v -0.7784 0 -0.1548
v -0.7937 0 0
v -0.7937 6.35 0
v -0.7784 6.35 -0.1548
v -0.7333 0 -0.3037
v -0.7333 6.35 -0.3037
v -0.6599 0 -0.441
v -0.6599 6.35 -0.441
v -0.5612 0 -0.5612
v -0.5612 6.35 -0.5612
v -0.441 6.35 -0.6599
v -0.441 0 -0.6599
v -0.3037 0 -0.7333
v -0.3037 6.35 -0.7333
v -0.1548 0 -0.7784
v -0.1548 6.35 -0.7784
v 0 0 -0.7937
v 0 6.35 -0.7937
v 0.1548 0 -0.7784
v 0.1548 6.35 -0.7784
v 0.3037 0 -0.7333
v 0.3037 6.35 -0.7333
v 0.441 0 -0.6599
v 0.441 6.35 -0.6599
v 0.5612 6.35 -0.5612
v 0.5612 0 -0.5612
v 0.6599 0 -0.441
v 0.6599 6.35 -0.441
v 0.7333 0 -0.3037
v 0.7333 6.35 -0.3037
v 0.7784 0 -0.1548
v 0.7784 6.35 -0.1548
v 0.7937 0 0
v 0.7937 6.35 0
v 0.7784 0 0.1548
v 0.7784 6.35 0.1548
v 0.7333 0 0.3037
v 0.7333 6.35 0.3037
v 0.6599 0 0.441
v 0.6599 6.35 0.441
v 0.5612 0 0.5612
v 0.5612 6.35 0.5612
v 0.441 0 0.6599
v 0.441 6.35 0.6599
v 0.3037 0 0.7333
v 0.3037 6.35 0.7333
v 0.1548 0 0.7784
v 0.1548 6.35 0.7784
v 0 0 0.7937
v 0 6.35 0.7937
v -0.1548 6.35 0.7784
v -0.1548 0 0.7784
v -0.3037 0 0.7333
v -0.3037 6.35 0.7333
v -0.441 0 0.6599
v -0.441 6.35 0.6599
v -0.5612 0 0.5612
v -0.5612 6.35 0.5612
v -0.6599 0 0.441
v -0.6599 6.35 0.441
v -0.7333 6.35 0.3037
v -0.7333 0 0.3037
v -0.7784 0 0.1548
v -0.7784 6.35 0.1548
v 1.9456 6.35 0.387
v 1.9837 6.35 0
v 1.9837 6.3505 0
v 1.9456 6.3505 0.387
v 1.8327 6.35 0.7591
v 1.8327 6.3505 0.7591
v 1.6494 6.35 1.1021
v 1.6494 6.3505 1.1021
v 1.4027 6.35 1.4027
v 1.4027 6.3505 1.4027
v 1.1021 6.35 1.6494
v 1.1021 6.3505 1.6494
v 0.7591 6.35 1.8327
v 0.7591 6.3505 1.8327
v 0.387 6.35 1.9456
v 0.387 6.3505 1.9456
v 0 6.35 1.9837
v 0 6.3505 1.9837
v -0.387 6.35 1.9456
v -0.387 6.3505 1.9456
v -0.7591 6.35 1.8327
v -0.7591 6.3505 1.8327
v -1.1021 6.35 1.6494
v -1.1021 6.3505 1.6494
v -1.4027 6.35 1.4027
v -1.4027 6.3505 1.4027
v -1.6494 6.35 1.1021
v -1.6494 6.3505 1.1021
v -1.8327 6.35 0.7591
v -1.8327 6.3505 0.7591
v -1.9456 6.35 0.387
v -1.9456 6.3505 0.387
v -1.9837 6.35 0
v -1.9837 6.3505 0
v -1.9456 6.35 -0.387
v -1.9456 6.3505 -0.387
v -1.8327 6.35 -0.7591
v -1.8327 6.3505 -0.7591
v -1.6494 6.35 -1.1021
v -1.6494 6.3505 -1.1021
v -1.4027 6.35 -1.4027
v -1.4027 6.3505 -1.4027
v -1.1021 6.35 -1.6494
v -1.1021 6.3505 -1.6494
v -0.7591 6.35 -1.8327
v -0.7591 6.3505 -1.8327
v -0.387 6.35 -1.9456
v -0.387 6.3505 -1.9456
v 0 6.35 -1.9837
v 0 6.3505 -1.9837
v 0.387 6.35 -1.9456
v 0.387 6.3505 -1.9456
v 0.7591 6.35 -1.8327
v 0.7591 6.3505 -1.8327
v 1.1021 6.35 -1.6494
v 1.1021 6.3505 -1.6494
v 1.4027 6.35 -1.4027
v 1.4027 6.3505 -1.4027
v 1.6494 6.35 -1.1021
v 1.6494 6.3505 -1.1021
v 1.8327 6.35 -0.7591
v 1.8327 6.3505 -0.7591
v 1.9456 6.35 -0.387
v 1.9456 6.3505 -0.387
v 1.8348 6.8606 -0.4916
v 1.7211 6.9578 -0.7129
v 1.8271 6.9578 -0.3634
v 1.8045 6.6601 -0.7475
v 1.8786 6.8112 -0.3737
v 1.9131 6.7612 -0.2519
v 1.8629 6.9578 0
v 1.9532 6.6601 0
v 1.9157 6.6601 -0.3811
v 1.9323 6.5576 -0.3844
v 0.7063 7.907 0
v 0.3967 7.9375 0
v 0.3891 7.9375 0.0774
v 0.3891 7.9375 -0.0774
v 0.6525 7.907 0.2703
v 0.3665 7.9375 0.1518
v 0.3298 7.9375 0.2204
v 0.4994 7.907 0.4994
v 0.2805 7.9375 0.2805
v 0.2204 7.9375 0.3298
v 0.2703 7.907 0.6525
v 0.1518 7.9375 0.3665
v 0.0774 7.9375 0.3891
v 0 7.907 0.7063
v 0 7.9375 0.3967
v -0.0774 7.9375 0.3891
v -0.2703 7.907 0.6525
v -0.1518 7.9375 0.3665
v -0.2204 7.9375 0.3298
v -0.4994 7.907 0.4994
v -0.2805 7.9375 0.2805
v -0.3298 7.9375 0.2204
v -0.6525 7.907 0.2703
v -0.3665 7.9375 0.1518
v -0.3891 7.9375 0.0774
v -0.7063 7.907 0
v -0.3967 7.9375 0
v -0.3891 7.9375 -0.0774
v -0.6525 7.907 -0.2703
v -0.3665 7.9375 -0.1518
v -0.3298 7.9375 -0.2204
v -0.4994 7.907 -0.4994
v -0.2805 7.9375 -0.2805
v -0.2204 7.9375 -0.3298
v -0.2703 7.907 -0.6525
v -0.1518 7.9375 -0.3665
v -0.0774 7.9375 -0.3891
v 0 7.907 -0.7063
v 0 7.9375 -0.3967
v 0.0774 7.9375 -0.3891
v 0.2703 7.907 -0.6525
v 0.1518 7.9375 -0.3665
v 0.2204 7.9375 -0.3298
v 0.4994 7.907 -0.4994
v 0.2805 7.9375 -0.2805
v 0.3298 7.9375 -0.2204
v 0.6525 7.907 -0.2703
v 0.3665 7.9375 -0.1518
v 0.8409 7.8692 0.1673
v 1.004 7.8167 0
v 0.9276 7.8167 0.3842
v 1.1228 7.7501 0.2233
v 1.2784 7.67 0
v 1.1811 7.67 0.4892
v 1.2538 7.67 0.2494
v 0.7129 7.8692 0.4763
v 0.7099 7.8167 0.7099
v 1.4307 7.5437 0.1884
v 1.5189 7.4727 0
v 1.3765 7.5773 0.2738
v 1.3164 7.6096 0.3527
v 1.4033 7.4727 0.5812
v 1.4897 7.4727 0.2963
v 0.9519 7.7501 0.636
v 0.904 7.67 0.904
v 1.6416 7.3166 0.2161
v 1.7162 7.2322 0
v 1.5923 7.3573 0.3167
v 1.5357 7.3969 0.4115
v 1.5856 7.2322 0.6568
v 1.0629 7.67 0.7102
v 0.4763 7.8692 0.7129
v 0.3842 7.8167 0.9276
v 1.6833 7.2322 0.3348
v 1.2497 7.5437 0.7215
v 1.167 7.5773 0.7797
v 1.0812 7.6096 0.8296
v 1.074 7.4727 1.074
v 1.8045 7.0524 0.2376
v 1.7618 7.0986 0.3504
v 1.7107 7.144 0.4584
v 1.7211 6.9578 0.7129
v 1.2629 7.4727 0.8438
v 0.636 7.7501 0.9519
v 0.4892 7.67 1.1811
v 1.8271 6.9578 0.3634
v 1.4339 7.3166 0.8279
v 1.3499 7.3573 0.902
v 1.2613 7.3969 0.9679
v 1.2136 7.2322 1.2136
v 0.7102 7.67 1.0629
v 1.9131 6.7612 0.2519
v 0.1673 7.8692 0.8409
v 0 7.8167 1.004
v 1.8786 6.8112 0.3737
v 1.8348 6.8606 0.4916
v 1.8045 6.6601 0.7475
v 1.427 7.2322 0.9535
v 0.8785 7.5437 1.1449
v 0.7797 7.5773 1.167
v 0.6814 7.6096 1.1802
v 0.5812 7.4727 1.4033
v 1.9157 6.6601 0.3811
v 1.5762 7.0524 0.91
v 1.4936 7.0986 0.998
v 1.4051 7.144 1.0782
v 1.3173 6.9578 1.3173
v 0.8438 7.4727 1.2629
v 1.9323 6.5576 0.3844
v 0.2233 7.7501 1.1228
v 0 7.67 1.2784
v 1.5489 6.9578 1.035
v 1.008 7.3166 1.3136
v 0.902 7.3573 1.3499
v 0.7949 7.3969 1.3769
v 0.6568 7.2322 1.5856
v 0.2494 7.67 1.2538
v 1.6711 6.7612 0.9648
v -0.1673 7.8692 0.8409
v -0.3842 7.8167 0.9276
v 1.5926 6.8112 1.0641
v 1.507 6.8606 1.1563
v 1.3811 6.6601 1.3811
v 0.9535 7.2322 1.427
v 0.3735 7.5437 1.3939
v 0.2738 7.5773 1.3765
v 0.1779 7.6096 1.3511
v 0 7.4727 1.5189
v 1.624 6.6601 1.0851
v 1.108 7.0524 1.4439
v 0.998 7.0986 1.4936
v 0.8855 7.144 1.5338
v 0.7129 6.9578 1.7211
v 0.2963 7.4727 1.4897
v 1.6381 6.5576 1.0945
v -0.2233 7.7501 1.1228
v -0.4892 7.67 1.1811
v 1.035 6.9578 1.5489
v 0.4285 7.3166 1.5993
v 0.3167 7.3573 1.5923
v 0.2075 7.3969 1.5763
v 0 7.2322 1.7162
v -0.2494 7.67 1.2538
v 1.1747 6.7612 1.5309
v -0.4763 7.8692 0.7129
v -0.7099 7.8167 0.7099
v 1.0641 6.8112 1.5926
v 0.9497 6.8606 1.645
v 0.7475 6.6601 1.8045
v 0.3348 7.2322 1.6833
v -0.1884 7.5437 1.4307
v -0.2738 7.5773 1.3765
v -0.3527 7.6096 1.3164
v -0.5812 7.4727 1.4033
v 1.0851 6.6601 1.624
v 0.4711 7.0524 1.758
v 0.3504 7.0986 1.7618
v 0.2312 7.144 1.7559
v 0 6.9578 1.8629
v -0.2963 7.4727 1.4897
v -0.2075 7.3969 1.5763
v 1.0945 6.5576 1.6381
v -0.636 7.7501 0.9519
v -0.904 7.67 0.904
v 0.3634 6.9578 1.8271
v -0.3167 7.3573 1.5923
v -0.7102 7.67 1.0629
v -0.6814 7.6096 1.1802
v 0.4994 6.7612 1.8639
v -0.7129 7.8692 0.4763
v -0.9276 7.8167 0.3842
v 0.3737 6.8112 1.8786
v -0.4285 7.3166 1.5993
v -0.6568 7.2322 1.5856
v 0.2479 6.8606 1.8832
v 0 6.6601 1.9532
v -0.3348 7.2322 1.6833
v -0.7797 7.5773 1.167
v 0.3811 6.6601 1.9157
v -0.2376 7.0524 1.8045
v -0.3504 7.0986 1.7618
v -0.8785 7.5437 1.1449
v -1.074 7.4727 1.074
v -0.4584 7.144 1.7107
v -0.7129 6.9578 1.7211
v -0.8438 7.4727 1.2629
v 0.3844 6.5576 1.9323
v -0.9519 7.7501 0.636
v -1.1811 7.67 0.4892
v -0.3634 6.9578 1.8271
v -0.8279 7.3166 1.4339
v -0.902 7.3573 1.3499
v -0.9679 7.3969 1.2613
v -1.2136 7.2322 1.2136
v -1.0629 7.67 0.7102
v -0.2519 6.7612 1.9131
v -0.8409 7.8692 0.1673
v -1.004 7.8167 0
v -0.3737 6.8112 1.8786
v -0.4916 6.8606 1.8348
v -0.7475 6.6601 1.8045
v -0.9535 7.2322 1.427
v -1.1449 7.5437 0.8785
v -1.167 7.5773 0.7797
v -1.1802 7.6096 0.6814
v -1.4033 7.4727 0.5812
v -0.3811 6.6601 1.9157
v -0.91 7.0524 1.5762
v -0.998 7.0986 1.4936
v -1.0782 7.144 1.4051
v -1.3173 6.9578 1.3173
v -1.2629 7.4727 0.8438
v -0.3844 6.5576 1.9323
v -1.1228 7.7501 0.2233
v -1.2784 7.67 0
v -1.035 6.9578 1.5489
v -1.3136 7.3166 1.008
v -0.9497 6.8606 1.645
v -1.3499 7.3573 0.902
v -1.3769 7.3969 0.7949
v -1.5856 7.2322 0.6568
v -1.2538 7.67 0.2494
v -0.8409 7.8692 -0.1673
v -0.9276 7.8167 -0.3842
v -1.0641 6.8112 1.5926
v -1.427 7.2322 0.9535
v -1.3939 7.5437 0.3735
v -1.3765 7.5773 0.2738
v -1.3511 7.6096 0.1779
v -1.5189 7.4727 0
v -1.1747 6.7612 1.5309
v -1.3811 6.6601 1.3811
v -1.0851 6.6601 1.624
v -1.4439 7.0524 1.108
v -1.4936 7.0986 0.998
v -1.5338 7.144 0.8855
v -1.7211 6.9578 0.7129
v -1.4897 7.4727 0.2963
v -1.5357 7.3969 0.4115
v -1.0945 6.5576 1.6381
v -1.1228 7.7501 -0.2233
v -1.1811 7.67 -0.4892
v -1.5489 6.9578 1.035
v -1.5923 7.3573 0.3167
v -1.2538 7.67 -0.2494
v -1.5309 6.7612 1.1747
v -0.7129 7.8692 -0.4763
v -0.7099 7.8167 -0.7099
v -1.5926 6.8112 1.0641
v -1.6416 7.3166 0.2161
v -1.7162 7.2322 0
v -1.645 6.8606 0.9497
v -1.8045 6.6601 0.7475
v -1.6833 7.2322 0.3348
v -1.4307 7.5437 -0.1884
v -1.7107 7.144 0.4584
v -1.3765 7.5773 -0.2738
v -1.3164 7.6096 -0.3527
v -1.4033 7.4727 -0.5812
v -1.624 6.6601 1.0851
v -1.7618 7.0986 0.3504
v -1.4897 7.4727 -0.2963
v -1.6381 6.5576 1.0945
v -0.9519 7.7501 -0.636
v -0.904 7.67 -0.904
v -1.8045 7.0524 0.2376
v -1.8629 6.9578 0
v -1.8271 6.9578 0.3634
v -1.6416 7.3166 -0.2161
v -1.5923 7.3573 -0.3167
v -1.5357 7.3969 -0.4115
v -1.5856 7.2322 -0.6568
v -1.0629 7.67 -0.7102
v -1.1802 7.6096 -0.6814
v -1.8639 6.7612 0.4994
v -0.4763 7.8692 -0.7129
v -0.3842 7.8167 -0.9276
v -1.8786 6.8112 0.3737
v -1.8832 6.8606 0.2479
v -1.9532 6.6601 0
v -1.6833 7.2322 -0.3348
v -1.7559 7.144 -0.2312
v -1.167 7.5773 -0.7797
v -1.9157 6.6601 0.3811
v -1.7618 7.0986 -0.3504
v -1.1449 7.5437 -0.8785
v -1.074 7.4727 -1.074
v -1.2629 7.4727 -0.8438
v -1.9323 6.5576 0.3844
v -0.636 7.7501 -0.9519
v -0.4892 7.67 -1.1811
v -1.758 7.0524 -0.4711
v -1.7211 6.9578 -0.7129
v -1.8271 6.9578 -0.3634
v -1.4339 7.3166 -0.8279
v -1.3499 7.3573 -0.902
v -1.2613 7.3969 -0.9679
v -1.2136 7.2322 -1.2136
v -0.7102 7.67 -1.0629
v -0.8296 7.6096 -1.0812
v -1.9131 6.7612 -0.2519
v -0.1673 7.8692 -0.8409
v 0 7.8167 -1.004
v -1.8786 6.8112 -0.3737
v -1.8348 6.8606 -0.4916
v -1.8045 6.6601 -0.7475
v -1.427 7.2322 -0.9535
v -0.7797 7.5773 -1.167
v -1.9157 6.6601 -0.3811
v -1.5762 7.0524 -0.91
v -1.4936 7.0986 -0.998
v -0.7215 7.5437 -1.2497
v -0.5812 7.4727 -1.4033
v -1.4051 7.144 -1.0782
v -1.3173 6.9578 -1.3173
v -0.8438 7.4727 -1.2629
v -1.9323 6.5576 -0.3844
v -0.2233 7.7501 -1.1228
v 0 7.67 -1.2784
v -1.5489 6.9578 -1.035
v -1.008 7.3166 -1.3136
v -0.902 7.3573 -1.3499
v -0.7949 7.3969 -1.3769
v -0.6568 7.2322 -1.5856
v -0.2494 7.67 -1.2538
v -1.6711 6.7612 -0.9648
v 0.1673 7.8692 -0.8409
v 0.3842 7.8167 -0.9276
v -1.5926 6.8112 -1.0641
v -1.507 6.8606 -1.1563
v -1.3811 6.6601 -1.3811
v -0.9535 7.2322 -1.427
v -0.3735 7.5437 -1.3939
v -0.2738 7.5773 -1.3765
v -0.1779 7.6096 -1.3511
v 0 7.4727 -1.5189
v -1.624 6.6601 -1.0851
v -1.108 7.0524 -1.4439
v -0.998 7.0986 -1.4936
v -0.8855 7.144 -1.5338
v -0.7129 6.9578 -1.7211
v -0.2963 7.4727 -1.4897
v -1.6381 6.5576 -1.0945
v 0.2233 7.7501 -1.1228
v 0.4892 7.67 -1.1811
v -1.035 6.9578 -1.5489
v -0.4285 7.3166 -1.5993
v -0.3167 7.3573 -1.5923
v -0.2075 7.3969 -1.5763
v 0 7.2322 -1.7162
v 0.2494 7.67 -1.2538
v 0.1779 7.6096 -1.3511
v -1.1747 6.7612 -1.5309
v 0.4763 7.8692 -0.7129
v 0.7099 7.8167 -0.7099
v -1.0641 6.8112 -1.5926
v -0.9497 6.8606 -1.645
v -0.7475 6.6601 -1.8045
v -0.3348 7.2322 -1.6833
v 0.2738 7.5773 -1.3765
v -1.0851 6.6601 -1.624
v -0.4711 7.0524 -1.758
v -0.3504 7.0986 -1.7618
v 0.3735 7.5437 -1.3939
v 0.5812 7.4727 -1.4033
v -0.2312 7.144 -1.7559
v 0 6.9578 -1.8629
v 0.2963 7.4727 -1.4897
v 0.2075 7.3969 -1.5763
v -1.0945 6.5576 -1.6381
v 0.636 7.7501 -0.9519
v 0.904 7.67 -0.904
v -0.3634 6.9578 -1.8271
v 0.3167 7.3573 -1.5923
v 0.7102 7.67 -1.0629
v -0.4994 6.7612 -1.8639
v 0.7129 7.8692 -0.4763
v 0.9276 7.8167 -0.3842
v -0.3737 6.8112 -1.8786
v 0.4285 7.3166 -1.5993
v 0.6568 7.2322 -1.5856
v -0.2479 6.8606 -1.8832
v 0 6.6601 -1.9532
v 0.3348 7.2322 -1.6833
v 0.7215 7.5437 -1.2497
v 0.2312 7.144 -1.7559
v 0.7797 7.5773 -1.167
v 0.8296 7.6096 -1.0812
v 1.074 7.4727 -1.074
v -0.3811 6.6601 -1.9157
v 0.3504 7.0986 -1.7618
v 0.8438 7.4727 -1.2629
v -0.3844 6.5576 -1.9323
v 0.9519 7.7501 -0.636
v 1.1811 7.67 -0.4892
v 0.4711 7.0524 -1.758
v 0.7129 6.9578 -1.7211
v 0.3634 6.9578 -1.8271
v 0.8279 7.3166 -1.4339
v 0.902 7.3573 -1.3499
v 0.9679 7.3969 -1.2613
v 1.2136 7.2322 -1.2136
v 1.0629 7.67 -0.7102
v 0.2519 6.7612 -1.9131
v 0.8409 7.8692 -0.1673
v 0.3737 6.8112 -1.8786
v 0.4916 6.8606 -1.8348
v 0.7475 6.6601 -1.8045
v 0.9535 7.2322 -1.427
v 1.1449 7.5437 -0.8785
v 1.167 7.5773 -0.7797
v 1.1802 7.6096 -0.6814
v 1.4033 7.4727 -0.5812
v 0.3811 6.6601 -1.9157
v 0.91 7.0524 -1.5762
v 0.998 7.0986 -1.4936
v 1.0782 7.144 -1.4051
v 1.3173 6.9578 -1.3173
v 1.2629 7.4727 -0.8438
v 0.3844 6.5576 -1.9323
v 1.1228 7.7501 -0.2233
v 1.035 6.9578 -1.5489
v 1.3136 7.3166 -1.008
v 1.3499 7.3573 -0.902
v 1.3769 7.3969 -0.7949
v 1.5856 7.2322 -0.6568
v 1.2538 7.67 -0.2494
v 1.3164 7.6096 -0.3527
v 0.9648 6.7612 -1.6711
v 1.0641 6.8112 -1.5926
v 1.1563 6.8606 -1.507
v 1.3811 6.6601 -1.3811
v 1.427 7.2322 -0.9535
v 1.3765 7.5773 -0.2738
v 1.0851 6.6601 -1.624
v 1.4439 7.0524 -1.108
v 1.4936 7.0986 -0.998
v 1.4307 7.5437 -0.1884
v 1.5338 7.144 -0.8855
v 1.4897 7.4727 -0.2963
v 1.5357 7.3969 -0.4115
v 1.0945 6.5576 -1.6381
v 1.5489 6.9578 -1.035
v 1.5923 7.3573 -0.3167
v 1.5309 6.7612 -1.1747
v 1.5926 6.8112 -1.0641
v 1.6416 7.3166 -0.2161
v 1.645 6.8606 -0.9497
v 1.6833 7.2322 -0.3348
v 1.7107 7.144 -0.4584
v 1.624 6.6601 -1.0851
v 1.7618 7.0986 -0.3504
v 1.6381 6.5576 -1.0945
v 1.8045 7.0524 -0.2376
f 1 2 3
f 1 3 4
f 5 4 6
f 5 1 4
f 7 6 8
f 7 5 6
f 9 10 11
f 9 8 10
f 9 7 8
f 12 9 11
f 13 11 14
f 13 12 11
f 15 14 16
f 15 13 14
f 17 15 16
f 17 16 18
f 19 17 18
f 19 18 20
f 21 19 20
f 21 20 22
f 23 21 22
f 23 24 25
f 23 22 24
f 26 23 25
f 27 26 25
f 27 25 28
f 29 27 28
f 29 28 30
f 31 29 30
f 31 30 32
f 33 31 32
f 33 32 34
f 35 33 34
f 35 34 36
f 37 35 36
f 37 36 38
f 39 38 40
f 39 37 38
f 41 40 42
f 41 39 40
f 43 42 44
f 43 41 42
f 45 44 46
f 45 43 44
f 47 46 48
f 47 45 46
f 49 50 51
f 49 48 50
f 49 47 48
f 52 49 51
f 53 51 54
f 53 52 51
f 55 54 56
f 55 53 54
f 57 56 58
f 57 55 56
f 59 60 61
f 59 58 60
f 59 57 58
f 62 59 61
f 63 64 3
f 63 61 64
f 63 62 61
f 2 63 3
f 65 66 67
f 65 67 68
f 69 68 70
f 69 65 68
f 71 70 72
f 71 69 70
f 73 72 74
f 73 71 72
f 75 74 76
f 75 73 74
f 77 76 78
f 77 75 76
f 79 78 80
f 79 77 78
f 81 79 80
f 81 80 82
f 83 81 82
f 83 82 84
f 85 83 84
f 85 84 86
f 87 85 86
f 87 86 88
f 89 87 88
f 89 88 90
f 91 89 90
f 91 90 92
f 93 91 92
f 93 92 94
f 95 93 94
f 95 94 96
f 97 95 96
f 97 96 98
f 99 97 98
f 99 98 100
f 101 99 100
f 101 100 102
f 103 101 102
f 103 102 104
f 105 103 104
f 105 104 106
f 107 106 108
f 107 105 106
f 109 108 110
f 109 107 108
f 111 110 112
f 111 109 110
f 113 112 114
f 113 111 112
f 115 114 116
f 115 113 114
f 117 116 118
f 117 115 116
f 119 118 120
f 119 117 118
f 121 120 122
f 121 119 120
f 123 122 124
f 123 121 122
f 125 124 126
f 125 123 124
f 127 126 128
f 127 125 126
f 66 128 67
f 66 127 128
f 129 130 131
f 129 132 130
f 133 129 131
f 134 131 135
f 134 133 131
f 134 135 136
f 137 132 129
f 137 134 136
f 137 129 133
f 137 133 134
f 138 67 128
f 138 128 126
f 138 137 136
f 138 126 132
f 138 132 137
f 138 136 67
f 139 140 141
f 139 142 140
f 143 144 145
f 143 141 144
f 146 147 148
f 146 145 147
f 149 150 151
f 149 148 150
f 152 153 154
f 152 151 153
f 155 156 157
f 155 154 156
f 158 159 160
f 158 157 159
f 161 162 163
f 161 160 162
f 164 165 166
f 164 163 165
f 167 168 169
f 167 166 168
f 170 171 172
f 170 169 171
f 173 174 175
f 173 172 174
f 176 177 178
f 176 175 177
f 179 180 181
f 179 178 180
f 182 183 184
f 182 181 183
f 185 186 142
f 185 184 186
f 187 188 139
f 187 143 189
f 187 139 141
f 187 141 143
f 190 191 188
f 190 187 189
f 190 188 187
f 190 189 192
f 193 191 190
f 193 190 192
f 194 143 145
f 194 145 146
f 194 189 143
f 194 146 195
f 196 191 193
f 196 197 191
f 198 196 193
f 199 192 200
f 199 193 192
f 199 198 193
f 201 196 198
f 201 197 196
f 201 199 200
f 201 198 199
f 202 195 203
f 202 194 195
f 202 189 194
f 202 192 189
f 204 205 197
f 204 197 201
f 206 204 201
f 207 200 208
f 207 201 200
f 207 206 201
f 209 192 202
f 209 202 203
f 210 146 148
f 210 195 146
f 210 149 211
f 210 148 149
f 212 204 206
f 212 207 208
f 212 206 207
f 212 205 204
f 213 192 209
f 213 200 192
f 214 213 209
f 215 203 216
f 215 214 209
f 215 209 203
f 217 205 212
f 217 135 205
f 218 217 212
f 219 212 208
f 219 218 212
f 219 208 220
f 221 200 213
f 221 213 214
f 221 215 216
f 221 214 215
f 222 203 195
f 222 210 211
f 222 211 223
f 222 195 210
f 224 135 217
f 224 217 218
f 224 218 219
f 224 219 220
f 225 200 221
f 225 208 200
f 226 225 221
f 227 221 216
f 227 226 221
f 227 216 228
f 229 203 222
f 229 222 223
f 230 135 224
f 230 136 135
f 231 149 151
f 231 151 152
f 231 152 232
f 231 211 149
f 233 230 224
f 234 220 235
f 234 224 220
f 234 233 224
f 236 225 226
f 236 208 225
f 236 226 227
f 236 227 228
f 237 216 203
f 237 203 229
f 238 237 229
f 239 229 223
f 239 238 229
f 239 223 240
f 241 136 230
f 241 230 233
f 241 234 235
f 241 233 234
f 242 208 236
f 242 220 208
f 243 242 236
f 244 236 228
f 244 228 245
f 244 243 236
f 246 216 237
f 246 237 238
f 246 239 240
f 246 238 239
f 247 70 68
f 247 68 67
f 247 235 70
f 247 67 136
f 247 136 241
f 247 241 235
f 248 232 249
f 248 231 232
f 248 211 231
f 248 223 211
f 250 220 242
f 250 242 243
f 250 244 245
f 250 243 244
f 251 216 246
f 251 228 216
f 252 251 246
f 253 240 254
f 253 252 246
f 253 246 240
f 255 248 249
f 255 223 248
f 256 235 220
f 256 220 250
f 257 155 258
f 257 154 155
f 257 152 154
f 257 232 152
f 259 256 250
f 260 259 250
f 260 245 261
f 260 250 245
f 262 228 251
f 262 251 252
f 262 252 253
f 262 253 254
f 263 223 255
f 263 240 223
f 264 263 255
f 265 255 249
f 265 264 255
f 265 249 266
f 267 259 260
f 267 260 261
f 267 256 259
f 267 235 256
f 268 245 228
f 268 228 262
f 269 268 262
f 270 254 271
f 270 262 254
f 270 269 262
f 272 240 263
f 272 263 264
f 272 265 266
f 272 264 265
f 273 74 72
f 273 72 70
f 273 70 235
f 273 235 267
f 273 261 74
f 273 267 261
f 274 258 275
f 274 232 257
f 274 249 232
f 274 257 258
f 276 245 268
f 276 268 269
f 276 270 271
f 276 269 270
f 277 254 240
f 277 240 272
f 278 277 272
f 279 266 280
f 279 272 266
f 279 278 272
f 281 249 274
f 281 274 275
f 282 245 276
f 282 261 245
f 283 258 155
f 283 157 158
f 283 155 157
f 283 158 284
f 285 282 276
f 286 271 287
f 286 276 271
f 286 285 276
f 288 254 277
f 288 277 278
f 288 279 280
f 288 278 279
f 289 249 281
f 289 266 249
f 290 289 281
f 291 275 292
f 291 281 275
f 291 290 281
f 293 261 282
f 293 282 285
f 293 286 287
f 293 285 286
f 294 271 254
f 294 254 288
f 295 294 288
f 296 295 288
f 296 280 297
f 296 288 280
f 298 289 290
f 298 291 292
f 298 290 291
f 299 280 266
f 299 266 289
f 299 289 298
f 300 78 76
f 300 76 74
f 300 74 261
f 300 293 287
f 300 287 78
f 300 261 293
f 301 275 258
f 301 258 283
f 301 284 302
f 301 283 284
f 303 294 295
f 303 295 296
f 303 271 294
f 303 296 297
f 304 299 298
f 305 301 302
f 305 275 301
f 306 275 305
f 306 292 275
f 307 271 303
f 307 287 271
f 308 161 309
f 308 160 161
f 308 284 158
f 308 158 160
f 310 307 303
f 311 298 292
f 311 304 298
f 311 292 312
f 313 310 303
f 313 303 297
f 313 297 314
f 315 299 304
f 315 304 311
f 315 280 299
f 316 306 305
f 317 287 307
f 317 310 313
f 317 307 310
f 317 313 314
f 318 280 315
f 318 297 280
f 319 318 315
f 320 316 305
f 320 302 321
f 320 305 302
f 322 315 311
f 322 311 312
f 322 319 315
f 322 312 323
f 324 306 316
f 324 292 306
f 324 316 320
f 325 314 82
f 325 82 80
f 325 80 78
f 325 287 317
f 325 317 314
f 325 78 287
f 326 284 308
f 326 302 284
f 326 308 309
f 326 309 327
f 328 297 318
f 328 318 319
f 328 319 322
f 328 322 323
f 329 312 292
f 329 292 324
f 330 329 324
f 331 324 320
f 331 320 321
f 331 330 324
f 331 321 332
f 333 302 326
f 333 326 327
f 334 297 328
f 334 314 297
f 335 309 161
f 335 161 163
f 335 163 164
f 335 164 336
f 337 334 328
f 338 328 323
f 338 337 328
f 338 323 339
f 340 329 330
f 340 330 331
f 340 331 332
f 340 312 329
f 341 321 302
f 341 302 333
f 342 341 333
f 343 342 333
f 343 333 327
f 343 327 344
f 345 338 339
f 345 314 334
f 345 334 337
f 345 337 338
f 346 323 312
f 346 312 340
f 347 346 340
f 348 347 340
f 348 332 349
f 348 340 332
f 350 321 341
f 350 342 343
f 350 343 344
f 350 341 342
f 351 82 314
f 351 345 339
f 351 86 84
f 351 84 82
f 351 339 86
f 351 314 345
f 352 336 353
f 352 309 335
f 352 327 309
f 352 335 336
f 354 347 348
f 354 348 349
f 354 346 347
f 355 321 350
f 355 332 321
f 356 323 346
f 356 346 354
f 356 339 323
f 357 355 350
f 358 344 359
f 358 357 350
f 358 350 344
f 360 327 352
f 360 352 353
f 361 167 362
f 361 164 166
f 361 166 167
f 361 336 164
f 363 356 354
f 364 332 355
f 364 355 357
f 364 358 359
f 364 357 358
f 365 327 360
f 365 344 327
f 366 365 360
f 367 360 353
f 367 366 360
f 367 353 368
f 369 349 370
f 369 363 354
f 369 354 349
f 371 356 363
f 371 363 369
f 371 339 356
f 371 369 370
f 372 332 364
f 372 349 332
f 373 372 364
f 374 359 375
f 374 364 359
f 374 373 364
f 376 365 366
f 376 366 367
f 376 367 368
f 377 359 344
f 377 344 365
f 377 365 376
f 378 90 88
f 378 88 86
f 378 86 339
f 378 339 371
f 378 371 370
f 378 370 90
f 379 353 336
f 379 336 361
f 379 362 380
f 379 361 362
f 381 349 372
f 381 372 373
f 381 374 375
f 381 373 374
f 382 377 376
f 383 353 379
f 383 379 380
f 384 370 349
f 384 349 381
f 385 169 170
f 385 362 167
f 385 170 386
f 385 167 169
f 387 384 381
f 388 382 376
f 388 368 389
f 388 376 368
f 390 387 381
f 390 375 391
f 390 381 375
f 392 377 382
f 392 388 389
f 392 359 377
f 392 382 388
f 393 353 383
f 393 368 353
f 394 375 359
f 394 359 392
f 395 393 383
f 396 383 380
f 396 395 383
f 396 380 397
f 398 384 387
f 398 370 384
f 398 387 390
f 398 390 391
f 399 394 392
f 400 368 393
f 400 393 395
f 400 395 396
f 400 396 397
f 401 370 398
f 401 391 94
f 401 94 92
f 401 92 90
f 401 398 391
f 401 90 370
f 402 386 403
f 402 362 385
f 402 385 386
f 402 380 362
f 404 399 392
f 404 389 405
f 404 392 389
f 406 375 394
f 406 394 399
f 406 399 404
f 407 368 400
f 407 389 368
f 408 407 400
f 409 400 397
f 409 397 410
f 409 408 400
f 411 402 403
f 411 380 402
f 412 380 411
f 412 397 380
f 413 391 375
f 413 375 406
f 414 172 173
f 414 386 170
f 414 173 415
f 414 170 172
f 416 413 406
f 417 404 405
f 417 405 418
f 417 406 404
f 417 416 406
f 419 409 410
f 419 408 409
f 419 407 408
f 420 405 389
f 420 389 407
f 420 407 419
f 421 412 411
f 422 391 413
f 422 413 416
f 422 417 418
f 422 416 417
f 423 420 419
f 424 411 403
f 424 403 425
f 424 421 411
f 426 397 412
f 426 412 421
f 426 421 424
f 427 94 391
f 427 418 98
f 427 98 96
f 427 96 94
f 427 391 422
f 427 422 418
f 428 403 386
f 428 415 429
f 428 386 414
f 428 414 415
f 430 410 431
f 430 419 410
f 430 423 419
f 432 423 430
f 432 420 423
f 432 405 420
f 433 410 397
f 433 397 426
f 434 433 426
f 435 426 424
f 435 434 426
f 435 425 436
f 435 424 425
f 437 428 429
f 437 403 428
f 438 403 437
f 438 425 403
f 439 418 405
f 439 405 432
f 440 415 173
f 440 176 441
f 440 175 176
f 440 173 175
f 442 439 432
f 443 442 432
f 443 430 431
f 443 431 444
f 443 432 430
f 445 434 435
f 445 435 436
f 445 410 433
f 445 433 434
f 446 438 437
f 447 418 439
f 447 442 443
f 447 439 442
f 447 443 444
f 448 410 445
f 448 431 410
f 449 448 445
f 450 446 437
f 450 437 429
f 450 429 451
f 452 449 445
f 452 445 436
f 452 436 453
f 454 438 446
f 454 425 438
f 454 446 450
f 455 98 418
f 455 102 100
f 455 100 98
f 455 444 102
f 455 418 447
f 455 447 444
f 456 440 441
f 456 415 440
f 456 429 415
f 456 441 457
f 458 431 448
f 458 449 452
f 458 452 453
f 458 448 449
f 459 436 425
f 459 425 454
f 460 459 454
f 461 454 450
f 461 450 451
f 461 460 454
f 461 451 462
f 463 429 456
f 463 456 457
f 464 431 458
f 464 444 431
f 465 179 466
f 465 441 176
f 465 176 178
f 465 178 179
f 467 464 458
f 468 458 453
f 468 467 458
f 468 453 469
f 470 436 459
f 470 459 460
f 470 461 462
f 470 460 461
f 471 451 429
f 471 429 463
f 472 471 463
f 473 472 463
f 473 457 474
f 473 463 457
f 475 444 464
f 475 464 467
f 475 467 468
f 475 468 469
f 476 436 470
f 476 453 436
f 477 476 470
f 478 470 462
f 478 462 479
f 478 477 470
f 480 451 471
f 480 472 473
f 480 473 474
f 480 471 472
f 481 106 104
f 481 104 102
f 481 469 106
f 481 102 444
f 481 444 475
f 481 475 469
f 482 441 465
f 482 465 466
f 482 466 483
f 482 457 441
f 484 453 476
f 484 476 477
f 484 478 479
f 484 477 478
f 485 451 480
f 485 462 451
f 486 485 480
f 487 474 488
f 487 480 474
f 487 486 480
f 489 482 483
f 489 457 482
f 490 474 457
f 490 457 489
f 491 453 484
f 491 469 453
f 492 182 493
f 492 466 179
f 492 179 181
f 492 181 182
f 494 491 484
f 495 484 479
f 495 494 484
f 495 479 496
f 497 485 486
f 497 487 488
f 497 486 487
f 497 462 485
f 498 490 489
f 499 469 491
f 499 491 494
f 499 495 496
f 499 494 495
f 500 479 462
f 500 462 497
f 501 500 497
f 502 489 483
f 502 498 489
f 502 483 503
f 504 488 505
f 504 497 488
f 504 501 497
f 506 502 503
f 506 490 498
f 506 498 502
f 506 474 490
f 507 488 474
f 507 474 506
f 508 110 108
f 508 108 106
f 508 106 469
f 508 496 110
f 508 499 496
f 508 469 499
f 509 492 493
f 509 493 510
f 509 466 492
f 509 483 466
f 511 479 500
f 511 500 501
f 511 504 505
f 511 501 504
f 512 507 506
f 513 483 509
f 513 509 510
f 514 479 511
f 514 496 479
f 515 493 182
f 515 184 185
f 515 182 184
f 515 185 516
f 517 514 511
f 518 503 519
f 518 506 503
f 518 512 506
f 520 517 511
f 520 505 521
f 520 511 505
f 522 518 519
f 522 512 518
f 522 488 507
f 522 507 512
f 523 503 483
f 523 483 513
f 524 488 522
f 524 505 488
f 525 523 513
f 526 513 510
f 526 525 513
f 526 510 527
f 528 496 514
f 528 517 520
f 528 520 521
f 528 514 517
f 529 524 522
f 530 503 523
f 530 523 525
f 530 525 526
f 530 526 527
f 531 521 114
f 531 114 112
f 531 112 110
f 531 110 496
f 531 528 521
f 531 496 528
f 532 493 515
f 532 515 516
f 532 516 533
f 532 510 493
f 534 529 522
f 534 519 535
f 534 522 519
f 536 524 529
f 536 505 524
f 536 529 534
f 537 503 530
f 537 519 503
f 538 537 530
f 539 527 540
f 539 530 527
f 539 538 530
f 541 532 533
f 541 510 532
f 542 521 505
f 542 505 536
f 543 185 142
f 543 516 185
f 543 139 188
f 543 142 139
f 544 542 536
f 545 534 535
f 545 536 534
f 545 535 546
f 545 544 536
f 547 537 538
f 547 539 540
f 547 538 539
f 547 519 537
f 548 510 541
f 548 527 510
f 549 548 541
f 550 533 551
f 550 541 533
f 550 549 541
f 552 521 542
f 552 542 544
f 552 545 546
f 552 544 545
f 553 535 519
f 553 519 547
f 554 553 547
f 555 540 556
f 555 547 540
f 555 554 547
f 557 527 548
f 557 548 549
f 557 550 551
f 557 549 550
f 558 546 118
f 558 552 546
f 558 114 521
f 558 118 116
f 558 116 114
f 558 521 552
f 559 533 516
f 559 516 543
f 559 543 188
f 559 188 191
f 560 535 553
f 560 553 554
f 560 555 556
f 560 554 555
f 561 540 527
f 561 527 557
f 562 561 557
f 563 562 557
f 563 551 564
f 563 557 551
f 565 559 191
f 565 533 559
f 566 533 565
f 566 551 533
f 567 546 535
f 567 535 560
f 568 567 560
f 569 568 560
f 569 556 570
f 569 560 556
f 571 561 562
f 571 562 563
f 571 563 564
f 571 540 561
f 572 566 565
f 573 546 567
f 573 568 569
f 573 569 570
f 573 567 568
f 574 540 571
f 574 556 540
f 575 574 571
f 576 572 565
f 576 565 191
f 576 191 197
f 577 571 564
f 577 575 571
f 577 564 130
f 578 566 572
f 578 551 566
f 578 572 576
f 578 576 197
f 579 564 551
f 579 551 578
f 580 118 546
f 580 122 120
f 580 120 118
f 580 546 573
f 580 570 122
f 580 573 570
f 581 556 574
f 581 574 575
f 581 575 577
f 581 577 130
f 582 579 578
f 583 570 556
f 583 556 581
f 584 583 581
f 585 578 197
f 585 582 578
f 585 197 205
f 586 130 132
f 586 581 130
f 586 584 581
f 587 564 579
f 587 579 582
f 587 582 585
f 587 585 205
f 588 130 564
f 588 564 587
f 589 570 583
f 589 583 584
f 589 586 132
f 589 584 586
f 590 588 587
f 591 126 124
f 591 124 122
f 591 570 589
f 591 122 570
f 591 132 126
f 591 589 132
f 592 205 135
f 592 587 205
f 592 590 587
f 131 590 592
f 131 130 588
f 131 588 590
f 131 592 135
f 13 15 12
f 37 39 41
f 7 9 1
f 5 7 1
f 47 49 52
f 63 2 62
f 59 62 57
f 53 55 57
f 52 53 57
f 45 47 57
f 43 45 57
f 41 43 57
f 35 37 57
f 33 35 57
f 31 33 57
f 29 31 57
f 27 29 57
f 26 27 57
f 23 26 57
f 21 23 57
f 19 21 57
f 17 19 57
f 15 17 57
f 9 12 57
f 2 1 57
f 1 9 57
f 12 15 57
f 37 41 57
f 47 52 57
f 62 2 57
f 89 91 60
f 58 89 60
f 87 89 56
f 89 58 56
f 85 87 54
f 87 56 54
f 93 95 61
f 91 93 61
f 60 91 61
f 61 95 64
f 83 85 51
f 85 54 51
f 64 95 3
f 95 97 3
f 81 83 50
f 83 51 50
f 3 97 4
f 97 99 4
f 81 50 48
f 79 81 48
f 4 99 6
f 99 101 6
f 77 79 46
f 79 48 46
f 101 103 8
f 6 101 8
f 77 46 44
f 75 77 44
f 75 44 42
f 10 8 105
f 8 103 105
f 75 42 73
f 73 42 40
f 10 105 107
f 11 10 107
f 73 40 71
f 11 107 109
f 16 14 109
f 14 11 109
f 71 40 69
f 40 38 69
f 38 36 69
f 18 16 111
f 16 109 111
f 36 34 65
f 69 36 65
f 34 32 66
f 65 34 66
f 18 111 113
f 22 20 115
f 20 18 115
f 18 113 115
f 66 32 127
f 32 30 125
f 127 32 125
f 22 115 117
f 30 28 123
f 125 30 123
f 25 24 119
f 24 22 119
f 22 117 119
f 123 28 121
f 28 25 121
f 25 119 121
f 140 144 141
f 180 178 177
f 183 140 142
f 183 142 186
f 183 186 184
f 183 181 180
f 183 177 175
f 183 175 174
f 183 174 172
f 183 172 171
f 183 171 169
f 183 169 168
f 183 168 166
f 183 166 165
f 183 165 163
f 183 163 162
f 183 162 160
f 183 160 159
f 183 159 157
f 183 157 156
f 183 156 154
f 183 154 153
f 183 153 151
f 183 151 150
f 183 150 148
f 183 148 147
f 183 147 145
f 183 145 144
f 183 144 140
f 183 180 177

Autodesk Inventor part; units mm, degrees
ref_plane "YZ Plane" through (0, 0, 0) normal (1, 0, 0) x (0, 1, 0)
ref_plane "XZ Plane" through (0, 0, 0) normal (0, 1, 0) x (-1, 0, 0)
ref_plane "XY Plane" through (0, 0, 0) normal (0, 0, 1) x (1, 0, 0)
sketch "Sketch1" plane through (0, 0, 0) normal (0, 1, 0) x (-1, 0, 0)
  circle A0 centre (0, 0) radius 0.7937
  dimension "d0" = 1.5875
extrude "Extrusion1" add sketch "Sketch1" along normal blind 6.35
sketch "Sketch2" plane through (0, 6.35, 0) normal (0, 1, 0) x (1, 0, 0)
  circle A0 centre (0, 0) radius 0.7937 projected
  circle A1 centre (0, 0) radius 1.9837
  dimension "d3" = 3.9675
extrude "Extrusion2" add sketch "Sketch2" along normal blind 1.5875
sketch "Sketch3" plane through (0, 6.35, 0) normal (0, 1, 0) x (1, 0, 0)
  circle A0 centre (0, 0) radius 0.7937
extrude "Extrusion3" add sketch "Sketch3" along normal blind 1.5875
fillet "Fillet1" radius 1.5875 1 edges at (-1.9837, 7.9375, 0)
properties part number "linkage peg"
